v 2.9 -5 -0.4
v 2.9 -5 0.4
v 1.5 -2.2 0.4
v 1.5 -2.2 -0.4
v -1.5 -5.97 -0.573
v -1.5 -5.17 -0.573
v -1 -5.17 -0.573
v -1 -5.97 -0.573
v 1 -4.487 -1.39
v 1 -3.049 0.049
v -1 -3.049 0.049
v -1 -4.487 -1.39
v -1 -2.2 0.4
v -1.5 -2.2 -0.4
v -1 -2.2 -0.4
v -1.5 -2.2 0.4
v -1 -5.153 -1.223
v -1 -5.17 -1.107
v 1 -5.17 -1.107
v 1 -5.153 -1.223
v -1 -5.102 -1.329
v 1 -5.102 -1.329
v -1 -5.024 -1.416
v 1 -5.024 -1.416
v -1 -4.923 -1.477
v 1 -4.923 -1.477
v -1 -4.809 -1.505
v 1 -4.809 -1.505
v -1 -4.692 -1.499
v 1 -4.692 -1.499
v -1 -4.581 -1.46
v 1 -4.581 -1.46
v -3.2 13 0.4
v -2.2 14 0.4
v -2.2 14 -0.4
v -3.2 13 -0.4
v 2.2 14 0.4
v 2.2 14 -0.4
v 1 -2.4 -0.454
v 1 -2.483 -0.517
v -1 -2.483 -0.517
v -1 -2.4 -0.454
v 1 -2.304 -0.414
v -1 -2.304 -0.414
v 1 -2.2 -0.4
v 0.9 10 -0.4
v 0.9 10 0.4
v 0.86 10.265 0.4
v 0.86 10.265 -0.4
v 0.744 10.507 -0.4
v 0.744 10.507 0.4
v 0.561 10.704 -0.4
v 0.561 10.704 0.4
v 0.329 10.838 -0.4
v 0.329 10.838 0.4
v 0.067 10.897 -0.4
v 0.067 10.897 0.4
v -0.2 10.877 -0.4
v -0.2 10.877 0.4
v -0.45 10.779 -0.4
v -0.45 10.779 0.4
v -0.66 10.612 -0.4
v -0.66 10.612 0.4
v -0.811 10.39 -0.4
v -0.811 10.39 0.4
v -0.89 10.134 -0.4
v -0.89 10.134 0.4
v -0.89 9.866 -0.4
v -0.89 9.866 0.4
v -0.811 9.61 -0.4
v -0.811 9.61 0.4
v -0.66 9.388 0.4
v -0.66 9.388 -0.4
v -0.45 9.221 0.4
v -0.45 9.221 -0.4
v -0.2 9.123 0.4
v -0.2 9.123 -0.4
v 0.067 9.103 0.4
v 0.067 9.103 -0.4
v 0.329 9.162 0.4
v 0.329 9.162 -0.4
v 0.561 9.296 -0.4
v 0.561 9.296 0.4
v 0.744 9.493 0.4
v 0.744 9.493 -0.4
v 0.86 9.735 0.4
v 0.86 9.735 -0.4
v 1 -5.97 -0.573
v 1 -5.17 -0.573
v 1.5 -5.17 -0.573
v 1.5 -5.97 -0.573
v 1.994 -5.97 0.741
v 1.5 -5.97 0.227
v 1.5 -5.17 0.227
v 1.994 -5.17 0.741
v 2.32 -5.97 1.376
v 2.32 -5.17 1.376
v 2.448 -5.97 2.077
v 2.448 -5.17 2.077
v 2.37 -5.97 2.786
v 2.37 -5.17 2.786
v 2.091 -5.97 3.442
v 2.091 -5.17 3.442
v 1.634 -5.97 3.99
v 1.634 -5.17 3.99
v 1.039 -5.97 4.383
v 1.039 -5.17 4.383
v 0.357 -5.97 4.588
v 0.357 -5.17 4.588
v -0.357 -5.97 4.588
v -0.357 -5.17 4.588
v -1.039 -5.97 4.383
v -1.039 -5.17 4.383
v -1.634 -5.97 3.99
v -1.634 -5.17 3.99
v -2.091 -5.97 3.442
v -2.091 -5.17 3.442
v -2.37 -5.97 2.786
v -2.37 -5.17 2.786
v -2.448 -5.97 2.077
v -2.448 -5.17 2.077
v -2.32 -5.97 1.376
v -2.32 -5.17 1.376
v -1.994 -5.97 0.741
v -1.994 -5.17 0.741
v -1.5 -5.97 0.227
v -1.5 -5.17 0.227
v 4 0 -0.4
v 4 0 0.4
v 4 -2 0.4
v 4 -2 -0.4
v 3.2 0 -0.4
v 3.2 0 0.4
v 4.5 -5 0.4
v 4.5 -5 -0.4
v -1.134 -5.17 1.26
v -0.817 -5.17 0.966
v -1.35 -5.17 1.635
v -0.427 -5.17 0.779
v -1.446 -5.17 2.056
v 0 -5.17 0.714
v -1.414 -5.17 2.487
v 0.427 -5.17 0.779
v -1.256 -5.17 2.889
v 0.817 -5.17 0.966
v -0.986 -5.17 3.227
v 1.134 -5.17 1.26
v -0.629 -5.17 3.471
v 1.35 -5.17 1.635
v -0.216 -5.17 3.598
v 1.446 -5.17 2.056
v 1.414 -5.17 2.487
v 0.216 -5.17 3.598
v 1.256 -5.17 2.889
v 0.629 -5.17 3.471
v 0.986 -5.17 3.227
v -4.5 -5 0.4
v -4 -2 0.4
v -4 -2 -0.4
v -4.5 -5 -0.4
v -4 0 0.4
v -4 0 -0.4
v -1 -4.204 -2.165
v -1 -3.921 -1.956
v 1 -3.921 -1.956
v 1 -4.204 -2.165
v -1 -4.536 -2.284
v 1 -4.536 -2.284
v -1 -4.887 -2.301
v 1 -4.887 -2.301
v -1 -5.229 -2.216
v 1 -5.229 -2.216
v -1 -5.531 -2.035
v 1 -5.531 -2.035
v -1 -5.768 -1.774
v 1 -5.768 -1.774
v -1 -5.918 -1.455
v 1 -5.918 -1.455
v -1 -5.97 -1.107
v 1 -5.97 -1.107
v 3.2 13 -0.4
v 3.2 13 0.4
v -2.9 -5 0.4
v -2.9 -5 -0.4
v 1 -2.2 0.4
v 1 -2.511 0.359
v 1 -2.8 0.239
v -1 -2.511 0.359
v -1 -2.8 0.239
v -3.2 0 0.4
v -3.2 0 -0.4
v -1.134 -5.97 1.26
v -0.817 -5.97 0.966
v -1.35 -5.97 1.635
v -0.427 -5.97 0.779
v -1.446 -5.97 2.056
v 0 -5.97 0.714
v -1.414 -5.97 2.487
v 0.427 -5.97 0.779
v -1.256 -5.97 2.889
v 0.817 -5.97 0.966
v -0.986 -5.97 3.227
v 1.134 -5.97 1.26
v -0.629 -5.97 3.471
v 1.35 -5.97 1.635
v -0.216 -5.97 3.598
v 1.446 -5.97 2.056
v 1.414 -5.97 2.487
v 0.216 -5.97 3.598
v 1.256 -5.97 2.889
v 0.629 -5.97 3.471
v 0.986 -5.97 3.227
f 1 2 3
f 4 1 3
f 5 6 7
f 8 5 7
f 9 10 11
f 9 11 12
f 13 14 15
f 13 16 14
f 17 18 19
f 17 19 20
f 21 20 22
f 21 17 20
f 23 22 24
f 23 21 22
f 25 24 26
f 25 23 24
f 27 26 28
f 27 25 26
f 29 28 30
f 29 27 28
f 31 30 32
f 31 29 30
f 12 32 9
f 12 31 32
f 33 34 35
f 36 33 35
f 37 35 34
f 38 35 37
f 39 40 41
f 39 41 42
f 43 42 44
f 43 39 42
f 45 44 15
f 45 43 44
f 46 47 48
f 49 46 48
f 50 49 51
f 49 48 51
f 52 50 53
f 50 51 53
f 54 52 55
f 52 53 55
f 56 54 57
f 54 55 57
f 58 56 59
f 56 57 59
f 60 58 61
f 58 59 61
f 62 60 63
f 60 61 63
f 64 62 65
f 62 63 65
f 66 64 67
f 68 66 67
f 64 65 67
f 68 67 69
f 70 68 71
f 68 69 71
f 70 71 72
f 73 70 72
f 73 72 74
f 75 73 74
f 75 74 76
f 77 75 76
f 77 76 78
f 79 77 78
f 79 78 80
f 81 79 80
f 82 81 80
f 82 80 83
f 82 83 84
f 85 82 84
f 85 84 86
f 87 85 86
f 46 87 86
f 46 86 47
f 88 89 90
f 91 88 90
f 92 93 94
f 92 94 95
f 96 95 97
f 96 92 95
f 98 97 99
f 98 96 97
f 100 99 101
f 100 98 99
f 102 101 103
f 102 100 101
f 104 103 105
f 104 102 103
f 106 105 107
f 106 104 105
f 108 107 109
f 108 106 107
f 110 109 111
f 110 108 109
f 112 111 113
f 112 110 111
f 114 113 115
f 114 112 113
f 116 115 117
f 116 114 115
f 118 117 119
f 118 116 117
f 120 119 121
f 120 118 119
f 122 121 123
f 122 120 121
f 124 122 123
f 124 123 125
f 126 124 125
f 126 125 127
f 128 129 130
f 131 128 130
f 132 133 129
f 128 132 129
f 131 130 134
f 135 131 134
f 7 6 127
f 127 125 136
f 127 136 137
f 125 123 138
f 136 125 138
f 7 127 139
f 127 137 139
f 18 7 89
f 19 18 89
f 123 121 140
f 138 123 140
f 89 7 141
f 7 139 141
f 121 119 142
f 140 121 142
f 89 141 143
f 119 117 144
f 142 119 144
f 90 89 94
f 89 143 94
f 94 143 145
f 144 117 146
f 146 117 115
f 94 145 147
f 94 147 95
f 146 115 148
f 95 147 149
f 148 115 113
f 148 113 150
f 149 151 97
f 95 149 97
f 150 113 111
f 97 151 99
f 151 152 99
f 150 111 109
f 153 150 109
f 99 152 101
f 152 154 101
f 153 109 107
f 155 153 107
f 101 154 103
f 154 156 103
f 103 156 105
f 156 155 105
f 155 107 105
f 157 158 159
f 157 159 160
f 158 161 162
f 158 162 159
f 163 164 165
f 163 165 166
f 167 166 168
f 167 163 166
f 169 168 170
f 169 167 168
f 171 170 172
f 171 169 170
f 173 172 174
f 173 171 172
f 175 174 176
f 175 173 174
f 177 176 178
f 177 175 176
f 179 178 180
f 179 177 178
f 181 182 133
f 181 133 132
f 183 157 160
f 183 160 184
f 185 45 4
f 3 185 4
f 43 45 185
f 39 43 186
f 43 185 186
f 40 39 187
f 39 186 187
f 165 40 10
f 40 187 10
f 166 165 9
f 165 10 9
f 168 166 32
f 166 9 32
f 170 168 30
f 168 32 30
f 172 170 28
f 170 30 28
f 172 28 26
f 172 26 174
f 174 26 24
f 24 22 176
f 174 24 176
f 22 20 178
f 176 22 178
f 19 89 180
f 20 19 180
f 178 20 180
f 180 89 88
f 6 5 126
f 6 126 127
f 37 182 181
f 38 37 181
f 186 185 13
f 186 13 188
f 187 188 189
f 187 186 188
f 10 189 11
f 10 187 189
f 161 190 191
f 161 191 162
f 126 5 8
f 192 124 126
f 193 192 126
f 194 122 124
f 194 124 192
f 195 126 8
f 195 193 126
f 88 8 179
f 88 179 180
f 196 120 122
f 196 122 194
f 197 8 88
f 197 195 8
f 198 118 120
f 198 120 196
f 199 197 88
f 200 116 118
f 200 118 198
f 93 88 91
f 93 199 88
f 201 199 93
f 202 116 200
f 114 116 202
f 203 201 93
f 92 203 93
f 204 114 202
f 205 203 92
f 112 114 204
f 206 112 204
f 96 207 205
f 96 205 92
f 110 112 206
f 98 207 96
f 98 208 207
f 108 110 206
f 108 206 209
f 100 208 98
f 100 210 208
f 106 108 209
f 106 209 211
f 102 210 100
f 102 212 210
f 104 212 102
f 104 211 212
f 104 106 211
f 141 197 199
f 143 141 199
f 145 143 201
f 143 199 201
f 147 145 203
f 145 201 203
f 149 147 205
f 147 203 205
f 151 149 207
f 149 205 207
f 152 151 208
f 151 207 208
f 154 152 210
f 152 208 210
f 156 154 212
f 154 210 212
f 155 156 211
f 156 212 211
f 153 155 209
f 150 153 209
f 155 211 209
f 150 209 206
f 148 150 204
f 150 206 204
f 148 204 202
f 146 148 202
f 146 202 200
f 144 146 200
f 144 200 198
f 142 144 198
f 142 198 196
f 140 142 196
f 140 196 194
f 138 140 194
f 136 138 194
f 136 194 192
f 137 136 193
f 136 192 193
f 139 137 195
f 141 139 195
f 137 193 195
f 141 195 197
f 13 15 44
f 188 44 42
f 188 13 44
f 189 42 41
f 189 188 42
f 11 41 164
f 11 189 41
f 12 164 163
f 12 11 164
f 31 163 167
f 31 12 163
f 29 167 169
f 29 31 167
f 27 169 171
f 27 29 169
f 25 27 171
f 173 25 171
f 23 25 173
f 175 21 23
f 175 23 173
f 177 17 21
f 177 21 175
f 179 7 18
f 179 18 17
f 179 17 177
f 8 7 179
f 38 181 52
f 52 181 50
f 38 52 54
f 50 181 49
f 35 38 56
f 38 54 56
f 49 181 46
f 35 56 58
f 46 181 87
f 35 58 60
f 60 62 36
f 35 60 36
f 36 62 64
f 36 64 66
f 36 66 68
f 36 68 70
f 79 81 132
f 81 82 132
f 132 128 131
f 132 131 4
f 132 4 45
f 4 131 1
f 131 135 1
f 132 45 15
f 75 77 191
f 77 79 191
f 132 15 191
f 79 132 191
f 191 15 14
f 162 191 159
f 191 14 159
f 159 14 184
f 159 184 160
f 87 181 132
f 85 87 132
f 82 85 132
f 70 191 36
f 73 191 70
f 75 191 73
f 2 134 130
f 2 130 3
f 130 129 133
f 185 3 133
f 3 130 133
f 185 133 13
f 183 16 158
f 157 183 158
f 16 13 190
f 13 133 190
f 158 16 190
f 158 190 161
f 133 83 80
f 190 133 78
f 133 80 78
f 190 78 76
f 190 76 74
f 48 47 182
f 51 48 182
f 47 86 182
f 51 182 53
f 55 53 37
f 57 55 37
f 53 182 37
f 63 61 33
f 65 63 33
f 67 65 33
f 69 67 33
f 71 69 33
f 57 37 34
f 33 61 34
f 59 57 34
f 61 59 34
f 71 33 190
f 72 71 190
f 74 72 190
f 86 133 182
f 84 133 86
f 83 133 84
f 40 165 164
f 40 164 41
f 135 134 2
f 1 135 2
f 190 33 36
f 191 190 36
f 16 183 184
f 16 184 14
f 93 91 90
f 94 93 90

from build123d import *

# Parameters (mm, degrees)
MAINBODYS_W                           = 6.4
MAINBODYS_H                           = 0.8
MAIN_BODY_DEPTH                       = 14
BOTTOM_OF_MAIN_BODY_REACH             = 16.367
BOTTOM_OF_MAIN_BODY_DIRECTION_2_REACH = 16.367
TOPHOLES_R                            = 0.9
TOP_HOLE_DEPTH                        = 15.727185746
F_45_DEGREE_FLANGE_DEPTH              = 2
BOTTOM_FLAT_FLANGE_DEPTH              = 2
EXTENDEDBOTTOMFLANGES_W               = 3
EXTENDEDBOTTOMFLANGES_H               = 0.8
EXTENDED_BOTTOM_FLANGE_DEPTH          = 0.8
BOSSEDCYLINDERBODYS_R                 = 1.45
BOSSED_CYLINDER_BODY_DEPTH            = 0.8
C_MAIN_BODY_SIZE                      = 1


# Sheet-metal steps are written as plain solids
with BuildPart() as part:
    # MainBodyS → MAIN BODY (new body)
    with BuildSketch(Plane(origin=(0, 0, 0), x_dir=(1, 0, 0), z_dir=(0, 1, 0))):
        Rectangle(MAINBODYS_W, MAINBODYS_H)
    extrude(amount=MAIN_BODY_DEPTH)

    # BOTTOM OF MAIN BODY: up to this face of the body (flat: up to its plane)
    bottom_of_main_body_end = Plane(part.part.faces().sort_by_distance((0, 7, 0.4))[0])
    # BottomMainBodyS → BOTTOM OF MAIN BODY (add, up to the picked face)
    with BuildSketch(Plane.XY, mode=Mode.PRIVATE) as bottom_of_main_body_sk1:
        Polygon((0, 0), (4, 0), (4, -2), (4.5, -5), (2.9, -5), (1.5, -2.2), (0, -2.2), align=None)
    bottom_of_main_body_tool1 = split(extrude(bottom_of_main_body_sk1.sketch, amount=BOTTOM_OF_MAIN_BODY_REACH, mode=Mode.PRIVATE), bisect_by=bottom_of_main_body_end, keep=Keep.BOTH, mode=Mode.PRIVATE)
    bottom_of_main_body = bottom_of_main_body_tool1.solids().sort_by(Axis((2.475691, -2.049989, 0), (0, 0, 1)))[0]
    add(bottom_of_main_body)

    # BOTTOM OF MAIN BODY direction 2: up to this face of the body (flat: up to its plane)
    bottom_of_main_body_direction_2_end = Plane(part.part.faces().sort_by_distance((0, 7, -0.4))[0])
    # BottomMainBodyS → BOTTOM OF MAIN BODY direction 2 (add, up to the picked face)
    with BuildSketch(Plane.XY, mode=Mode.PRIVATE) as bottom_of_main_body_direction_2_sk1:
        Polygon((0, 0), (4, 0), (4, -2), (4.5, -5), (2.9, -5), (1.5, -2.2), (0, -2.2), align=None)
    bottom_of_main_body_direction_2_tool1 = split(extrude(bottom_of_main_body_direction_2_sk1.sketch, amount=-BOTTOM_OF_MAIN_BODY_DIRECTION_2_REACH, mode=Mode.PRIVATE), bisect_by=bottom_of_main_body_direction_2_end, keep=Keep.BOTH, mode=Mode.PRIVATE)
    bottom_of_main_body_direction_2 = bottom_of_main_body_direction_2_tool1.solids().sort_by(Axis((2.475691, -2.049989, 0), (0, 0, -1)))[0]
    add(bottom_of_main_body_direction_2)

    # BMB HM: BOTTOM OF MAIN BODY, BOTTOM OF MAIN BODY direction 2 across plane
    add(bottom_of_main_body.mirror(Plane(origin=(0, 0, 0), x_dir=(0, 0, 1), z_dir=(1, 0, 0))))
    add(bottom_of_main_body_direction_2.mirror(Plane(origin=(0, 0, 0), x_dir=(0, 0, 1), z_dir=(1, 0, 0))))

    # TopHoleS → TOP HOLE (cut, through all)
    with BuildSketch(Plane.XY.offset(0.4)):
        with Locations((0, 10)):
            Circle(TOPHOLES_R)
    extrude(amount=-TOP_HOLE_DEPTH, mode=Mode.SUBTRACT)

    # 45 DEGREE FLANGE section (across the edge) → 45 DEGREE FLANGE (add)
    with BuildSketch(Plane(origin=(1, -2.365685425, -0.4), x_dir=(0, 0.7071067811865438, -0.7071067811865512), z_dir=(-1, 0, 0))):
        with BuildLine():
            Line((-0.8, 0.165685425), (-0.8, 2.2))
            Line((-0.8, 2.2), (0, 2.2))
            Line((0, 2.2), (0, 0.165685425))
            ThreePointArc((0, 0.165685425), (0.030448187, 0.012612052), (0.117157288, -0.117157288))
            Line((0.117157288, -0.117157288), (-0.448528137, -0.682842712))
            ThreePointArc((-0.448528137, -0.682842712), (-0.708655439, -0.293534694), (-0.8, 0.165685425))
        make_face()
    extrude(amount=F_45_DEGREE_FLANGE_DEPTH)

    # BOTTOM FLAT FLANGE section (across the edge) → BOTTOM FLAT FLANGE (add)
    with BuildSketch(Plane(origin=(-1, -5.169848481, -2.072792206), x_dir=(0, 1, 0), z_dir=(1, 0, 0))):
        with BuildLine():
            Line((-0.8, 0.965685425), (-0.8, 1.5))
            Line((-0.8, 1.5), (0, 1.5))
            Line((0, 1.5), (0, 0.965685425))
            ThreePointArc((0, 0.965685425), (0.246926627, 0.596133612), (0.682842712, 0.682842712))
            Line((0.682842712, 0.682842712), (1.248528137, 0.117157288))
            ThreePointArc((1.248528137, 0.117157288), (-0.059220119, -0.142970014), (-0.8, 0.965685425))
        make_face()
    extrude(amount=BOTTOM_FLAT_FLANGE_DEPTH)

    # ExtendedBottomFlangeS → EXTENDED BOTTOM FLANGE (add)
    with BuildSketch(Plane.XY.offset(-0.572792206)):
        with Locations((0, -5.569848481)):
            Rectangle(EXTENDEDBOTTOMFLANGES_W, EXTENDEDBOTTOMFLANGES_H)
    extrude(amount=EXTENDED_BOTTOM_FLANGE_DEPTH)

    # BossedCylinderBodyS → BOSSED  CYLINDER BODY (add)
    with BuildSketch(Plane.XZ.offset(5.969848481)):
        with BuildLine():
            Line((-1.5, 0.227207794), (1.5, 0.227207794))
            ThreePointArc((1.5, 0.227207794), (0, 4.614344857), (-1.5, 0.227207794))
        make_face()
        with Locations(Location((0, 2.164344857, 0), (0, 0, 270))):
            Circle(BOSSEDCYLINDERBODYS_R, mode=Mode.SUBTRACT)
    extrude(amount=-BOSSED_CYLINDER_BODY_DEPTH)

    # C MAIN BODY
    c_main_body_edges = [part.edges().sort_by_distance(p)[0] for p in [
        (-3.2, 14, 0),
        (3.2, 14, 0),
    ]]
    chamfer(c_main_body_edges, length=C_MAIN_BODY_SIZE)


solid = part.part
